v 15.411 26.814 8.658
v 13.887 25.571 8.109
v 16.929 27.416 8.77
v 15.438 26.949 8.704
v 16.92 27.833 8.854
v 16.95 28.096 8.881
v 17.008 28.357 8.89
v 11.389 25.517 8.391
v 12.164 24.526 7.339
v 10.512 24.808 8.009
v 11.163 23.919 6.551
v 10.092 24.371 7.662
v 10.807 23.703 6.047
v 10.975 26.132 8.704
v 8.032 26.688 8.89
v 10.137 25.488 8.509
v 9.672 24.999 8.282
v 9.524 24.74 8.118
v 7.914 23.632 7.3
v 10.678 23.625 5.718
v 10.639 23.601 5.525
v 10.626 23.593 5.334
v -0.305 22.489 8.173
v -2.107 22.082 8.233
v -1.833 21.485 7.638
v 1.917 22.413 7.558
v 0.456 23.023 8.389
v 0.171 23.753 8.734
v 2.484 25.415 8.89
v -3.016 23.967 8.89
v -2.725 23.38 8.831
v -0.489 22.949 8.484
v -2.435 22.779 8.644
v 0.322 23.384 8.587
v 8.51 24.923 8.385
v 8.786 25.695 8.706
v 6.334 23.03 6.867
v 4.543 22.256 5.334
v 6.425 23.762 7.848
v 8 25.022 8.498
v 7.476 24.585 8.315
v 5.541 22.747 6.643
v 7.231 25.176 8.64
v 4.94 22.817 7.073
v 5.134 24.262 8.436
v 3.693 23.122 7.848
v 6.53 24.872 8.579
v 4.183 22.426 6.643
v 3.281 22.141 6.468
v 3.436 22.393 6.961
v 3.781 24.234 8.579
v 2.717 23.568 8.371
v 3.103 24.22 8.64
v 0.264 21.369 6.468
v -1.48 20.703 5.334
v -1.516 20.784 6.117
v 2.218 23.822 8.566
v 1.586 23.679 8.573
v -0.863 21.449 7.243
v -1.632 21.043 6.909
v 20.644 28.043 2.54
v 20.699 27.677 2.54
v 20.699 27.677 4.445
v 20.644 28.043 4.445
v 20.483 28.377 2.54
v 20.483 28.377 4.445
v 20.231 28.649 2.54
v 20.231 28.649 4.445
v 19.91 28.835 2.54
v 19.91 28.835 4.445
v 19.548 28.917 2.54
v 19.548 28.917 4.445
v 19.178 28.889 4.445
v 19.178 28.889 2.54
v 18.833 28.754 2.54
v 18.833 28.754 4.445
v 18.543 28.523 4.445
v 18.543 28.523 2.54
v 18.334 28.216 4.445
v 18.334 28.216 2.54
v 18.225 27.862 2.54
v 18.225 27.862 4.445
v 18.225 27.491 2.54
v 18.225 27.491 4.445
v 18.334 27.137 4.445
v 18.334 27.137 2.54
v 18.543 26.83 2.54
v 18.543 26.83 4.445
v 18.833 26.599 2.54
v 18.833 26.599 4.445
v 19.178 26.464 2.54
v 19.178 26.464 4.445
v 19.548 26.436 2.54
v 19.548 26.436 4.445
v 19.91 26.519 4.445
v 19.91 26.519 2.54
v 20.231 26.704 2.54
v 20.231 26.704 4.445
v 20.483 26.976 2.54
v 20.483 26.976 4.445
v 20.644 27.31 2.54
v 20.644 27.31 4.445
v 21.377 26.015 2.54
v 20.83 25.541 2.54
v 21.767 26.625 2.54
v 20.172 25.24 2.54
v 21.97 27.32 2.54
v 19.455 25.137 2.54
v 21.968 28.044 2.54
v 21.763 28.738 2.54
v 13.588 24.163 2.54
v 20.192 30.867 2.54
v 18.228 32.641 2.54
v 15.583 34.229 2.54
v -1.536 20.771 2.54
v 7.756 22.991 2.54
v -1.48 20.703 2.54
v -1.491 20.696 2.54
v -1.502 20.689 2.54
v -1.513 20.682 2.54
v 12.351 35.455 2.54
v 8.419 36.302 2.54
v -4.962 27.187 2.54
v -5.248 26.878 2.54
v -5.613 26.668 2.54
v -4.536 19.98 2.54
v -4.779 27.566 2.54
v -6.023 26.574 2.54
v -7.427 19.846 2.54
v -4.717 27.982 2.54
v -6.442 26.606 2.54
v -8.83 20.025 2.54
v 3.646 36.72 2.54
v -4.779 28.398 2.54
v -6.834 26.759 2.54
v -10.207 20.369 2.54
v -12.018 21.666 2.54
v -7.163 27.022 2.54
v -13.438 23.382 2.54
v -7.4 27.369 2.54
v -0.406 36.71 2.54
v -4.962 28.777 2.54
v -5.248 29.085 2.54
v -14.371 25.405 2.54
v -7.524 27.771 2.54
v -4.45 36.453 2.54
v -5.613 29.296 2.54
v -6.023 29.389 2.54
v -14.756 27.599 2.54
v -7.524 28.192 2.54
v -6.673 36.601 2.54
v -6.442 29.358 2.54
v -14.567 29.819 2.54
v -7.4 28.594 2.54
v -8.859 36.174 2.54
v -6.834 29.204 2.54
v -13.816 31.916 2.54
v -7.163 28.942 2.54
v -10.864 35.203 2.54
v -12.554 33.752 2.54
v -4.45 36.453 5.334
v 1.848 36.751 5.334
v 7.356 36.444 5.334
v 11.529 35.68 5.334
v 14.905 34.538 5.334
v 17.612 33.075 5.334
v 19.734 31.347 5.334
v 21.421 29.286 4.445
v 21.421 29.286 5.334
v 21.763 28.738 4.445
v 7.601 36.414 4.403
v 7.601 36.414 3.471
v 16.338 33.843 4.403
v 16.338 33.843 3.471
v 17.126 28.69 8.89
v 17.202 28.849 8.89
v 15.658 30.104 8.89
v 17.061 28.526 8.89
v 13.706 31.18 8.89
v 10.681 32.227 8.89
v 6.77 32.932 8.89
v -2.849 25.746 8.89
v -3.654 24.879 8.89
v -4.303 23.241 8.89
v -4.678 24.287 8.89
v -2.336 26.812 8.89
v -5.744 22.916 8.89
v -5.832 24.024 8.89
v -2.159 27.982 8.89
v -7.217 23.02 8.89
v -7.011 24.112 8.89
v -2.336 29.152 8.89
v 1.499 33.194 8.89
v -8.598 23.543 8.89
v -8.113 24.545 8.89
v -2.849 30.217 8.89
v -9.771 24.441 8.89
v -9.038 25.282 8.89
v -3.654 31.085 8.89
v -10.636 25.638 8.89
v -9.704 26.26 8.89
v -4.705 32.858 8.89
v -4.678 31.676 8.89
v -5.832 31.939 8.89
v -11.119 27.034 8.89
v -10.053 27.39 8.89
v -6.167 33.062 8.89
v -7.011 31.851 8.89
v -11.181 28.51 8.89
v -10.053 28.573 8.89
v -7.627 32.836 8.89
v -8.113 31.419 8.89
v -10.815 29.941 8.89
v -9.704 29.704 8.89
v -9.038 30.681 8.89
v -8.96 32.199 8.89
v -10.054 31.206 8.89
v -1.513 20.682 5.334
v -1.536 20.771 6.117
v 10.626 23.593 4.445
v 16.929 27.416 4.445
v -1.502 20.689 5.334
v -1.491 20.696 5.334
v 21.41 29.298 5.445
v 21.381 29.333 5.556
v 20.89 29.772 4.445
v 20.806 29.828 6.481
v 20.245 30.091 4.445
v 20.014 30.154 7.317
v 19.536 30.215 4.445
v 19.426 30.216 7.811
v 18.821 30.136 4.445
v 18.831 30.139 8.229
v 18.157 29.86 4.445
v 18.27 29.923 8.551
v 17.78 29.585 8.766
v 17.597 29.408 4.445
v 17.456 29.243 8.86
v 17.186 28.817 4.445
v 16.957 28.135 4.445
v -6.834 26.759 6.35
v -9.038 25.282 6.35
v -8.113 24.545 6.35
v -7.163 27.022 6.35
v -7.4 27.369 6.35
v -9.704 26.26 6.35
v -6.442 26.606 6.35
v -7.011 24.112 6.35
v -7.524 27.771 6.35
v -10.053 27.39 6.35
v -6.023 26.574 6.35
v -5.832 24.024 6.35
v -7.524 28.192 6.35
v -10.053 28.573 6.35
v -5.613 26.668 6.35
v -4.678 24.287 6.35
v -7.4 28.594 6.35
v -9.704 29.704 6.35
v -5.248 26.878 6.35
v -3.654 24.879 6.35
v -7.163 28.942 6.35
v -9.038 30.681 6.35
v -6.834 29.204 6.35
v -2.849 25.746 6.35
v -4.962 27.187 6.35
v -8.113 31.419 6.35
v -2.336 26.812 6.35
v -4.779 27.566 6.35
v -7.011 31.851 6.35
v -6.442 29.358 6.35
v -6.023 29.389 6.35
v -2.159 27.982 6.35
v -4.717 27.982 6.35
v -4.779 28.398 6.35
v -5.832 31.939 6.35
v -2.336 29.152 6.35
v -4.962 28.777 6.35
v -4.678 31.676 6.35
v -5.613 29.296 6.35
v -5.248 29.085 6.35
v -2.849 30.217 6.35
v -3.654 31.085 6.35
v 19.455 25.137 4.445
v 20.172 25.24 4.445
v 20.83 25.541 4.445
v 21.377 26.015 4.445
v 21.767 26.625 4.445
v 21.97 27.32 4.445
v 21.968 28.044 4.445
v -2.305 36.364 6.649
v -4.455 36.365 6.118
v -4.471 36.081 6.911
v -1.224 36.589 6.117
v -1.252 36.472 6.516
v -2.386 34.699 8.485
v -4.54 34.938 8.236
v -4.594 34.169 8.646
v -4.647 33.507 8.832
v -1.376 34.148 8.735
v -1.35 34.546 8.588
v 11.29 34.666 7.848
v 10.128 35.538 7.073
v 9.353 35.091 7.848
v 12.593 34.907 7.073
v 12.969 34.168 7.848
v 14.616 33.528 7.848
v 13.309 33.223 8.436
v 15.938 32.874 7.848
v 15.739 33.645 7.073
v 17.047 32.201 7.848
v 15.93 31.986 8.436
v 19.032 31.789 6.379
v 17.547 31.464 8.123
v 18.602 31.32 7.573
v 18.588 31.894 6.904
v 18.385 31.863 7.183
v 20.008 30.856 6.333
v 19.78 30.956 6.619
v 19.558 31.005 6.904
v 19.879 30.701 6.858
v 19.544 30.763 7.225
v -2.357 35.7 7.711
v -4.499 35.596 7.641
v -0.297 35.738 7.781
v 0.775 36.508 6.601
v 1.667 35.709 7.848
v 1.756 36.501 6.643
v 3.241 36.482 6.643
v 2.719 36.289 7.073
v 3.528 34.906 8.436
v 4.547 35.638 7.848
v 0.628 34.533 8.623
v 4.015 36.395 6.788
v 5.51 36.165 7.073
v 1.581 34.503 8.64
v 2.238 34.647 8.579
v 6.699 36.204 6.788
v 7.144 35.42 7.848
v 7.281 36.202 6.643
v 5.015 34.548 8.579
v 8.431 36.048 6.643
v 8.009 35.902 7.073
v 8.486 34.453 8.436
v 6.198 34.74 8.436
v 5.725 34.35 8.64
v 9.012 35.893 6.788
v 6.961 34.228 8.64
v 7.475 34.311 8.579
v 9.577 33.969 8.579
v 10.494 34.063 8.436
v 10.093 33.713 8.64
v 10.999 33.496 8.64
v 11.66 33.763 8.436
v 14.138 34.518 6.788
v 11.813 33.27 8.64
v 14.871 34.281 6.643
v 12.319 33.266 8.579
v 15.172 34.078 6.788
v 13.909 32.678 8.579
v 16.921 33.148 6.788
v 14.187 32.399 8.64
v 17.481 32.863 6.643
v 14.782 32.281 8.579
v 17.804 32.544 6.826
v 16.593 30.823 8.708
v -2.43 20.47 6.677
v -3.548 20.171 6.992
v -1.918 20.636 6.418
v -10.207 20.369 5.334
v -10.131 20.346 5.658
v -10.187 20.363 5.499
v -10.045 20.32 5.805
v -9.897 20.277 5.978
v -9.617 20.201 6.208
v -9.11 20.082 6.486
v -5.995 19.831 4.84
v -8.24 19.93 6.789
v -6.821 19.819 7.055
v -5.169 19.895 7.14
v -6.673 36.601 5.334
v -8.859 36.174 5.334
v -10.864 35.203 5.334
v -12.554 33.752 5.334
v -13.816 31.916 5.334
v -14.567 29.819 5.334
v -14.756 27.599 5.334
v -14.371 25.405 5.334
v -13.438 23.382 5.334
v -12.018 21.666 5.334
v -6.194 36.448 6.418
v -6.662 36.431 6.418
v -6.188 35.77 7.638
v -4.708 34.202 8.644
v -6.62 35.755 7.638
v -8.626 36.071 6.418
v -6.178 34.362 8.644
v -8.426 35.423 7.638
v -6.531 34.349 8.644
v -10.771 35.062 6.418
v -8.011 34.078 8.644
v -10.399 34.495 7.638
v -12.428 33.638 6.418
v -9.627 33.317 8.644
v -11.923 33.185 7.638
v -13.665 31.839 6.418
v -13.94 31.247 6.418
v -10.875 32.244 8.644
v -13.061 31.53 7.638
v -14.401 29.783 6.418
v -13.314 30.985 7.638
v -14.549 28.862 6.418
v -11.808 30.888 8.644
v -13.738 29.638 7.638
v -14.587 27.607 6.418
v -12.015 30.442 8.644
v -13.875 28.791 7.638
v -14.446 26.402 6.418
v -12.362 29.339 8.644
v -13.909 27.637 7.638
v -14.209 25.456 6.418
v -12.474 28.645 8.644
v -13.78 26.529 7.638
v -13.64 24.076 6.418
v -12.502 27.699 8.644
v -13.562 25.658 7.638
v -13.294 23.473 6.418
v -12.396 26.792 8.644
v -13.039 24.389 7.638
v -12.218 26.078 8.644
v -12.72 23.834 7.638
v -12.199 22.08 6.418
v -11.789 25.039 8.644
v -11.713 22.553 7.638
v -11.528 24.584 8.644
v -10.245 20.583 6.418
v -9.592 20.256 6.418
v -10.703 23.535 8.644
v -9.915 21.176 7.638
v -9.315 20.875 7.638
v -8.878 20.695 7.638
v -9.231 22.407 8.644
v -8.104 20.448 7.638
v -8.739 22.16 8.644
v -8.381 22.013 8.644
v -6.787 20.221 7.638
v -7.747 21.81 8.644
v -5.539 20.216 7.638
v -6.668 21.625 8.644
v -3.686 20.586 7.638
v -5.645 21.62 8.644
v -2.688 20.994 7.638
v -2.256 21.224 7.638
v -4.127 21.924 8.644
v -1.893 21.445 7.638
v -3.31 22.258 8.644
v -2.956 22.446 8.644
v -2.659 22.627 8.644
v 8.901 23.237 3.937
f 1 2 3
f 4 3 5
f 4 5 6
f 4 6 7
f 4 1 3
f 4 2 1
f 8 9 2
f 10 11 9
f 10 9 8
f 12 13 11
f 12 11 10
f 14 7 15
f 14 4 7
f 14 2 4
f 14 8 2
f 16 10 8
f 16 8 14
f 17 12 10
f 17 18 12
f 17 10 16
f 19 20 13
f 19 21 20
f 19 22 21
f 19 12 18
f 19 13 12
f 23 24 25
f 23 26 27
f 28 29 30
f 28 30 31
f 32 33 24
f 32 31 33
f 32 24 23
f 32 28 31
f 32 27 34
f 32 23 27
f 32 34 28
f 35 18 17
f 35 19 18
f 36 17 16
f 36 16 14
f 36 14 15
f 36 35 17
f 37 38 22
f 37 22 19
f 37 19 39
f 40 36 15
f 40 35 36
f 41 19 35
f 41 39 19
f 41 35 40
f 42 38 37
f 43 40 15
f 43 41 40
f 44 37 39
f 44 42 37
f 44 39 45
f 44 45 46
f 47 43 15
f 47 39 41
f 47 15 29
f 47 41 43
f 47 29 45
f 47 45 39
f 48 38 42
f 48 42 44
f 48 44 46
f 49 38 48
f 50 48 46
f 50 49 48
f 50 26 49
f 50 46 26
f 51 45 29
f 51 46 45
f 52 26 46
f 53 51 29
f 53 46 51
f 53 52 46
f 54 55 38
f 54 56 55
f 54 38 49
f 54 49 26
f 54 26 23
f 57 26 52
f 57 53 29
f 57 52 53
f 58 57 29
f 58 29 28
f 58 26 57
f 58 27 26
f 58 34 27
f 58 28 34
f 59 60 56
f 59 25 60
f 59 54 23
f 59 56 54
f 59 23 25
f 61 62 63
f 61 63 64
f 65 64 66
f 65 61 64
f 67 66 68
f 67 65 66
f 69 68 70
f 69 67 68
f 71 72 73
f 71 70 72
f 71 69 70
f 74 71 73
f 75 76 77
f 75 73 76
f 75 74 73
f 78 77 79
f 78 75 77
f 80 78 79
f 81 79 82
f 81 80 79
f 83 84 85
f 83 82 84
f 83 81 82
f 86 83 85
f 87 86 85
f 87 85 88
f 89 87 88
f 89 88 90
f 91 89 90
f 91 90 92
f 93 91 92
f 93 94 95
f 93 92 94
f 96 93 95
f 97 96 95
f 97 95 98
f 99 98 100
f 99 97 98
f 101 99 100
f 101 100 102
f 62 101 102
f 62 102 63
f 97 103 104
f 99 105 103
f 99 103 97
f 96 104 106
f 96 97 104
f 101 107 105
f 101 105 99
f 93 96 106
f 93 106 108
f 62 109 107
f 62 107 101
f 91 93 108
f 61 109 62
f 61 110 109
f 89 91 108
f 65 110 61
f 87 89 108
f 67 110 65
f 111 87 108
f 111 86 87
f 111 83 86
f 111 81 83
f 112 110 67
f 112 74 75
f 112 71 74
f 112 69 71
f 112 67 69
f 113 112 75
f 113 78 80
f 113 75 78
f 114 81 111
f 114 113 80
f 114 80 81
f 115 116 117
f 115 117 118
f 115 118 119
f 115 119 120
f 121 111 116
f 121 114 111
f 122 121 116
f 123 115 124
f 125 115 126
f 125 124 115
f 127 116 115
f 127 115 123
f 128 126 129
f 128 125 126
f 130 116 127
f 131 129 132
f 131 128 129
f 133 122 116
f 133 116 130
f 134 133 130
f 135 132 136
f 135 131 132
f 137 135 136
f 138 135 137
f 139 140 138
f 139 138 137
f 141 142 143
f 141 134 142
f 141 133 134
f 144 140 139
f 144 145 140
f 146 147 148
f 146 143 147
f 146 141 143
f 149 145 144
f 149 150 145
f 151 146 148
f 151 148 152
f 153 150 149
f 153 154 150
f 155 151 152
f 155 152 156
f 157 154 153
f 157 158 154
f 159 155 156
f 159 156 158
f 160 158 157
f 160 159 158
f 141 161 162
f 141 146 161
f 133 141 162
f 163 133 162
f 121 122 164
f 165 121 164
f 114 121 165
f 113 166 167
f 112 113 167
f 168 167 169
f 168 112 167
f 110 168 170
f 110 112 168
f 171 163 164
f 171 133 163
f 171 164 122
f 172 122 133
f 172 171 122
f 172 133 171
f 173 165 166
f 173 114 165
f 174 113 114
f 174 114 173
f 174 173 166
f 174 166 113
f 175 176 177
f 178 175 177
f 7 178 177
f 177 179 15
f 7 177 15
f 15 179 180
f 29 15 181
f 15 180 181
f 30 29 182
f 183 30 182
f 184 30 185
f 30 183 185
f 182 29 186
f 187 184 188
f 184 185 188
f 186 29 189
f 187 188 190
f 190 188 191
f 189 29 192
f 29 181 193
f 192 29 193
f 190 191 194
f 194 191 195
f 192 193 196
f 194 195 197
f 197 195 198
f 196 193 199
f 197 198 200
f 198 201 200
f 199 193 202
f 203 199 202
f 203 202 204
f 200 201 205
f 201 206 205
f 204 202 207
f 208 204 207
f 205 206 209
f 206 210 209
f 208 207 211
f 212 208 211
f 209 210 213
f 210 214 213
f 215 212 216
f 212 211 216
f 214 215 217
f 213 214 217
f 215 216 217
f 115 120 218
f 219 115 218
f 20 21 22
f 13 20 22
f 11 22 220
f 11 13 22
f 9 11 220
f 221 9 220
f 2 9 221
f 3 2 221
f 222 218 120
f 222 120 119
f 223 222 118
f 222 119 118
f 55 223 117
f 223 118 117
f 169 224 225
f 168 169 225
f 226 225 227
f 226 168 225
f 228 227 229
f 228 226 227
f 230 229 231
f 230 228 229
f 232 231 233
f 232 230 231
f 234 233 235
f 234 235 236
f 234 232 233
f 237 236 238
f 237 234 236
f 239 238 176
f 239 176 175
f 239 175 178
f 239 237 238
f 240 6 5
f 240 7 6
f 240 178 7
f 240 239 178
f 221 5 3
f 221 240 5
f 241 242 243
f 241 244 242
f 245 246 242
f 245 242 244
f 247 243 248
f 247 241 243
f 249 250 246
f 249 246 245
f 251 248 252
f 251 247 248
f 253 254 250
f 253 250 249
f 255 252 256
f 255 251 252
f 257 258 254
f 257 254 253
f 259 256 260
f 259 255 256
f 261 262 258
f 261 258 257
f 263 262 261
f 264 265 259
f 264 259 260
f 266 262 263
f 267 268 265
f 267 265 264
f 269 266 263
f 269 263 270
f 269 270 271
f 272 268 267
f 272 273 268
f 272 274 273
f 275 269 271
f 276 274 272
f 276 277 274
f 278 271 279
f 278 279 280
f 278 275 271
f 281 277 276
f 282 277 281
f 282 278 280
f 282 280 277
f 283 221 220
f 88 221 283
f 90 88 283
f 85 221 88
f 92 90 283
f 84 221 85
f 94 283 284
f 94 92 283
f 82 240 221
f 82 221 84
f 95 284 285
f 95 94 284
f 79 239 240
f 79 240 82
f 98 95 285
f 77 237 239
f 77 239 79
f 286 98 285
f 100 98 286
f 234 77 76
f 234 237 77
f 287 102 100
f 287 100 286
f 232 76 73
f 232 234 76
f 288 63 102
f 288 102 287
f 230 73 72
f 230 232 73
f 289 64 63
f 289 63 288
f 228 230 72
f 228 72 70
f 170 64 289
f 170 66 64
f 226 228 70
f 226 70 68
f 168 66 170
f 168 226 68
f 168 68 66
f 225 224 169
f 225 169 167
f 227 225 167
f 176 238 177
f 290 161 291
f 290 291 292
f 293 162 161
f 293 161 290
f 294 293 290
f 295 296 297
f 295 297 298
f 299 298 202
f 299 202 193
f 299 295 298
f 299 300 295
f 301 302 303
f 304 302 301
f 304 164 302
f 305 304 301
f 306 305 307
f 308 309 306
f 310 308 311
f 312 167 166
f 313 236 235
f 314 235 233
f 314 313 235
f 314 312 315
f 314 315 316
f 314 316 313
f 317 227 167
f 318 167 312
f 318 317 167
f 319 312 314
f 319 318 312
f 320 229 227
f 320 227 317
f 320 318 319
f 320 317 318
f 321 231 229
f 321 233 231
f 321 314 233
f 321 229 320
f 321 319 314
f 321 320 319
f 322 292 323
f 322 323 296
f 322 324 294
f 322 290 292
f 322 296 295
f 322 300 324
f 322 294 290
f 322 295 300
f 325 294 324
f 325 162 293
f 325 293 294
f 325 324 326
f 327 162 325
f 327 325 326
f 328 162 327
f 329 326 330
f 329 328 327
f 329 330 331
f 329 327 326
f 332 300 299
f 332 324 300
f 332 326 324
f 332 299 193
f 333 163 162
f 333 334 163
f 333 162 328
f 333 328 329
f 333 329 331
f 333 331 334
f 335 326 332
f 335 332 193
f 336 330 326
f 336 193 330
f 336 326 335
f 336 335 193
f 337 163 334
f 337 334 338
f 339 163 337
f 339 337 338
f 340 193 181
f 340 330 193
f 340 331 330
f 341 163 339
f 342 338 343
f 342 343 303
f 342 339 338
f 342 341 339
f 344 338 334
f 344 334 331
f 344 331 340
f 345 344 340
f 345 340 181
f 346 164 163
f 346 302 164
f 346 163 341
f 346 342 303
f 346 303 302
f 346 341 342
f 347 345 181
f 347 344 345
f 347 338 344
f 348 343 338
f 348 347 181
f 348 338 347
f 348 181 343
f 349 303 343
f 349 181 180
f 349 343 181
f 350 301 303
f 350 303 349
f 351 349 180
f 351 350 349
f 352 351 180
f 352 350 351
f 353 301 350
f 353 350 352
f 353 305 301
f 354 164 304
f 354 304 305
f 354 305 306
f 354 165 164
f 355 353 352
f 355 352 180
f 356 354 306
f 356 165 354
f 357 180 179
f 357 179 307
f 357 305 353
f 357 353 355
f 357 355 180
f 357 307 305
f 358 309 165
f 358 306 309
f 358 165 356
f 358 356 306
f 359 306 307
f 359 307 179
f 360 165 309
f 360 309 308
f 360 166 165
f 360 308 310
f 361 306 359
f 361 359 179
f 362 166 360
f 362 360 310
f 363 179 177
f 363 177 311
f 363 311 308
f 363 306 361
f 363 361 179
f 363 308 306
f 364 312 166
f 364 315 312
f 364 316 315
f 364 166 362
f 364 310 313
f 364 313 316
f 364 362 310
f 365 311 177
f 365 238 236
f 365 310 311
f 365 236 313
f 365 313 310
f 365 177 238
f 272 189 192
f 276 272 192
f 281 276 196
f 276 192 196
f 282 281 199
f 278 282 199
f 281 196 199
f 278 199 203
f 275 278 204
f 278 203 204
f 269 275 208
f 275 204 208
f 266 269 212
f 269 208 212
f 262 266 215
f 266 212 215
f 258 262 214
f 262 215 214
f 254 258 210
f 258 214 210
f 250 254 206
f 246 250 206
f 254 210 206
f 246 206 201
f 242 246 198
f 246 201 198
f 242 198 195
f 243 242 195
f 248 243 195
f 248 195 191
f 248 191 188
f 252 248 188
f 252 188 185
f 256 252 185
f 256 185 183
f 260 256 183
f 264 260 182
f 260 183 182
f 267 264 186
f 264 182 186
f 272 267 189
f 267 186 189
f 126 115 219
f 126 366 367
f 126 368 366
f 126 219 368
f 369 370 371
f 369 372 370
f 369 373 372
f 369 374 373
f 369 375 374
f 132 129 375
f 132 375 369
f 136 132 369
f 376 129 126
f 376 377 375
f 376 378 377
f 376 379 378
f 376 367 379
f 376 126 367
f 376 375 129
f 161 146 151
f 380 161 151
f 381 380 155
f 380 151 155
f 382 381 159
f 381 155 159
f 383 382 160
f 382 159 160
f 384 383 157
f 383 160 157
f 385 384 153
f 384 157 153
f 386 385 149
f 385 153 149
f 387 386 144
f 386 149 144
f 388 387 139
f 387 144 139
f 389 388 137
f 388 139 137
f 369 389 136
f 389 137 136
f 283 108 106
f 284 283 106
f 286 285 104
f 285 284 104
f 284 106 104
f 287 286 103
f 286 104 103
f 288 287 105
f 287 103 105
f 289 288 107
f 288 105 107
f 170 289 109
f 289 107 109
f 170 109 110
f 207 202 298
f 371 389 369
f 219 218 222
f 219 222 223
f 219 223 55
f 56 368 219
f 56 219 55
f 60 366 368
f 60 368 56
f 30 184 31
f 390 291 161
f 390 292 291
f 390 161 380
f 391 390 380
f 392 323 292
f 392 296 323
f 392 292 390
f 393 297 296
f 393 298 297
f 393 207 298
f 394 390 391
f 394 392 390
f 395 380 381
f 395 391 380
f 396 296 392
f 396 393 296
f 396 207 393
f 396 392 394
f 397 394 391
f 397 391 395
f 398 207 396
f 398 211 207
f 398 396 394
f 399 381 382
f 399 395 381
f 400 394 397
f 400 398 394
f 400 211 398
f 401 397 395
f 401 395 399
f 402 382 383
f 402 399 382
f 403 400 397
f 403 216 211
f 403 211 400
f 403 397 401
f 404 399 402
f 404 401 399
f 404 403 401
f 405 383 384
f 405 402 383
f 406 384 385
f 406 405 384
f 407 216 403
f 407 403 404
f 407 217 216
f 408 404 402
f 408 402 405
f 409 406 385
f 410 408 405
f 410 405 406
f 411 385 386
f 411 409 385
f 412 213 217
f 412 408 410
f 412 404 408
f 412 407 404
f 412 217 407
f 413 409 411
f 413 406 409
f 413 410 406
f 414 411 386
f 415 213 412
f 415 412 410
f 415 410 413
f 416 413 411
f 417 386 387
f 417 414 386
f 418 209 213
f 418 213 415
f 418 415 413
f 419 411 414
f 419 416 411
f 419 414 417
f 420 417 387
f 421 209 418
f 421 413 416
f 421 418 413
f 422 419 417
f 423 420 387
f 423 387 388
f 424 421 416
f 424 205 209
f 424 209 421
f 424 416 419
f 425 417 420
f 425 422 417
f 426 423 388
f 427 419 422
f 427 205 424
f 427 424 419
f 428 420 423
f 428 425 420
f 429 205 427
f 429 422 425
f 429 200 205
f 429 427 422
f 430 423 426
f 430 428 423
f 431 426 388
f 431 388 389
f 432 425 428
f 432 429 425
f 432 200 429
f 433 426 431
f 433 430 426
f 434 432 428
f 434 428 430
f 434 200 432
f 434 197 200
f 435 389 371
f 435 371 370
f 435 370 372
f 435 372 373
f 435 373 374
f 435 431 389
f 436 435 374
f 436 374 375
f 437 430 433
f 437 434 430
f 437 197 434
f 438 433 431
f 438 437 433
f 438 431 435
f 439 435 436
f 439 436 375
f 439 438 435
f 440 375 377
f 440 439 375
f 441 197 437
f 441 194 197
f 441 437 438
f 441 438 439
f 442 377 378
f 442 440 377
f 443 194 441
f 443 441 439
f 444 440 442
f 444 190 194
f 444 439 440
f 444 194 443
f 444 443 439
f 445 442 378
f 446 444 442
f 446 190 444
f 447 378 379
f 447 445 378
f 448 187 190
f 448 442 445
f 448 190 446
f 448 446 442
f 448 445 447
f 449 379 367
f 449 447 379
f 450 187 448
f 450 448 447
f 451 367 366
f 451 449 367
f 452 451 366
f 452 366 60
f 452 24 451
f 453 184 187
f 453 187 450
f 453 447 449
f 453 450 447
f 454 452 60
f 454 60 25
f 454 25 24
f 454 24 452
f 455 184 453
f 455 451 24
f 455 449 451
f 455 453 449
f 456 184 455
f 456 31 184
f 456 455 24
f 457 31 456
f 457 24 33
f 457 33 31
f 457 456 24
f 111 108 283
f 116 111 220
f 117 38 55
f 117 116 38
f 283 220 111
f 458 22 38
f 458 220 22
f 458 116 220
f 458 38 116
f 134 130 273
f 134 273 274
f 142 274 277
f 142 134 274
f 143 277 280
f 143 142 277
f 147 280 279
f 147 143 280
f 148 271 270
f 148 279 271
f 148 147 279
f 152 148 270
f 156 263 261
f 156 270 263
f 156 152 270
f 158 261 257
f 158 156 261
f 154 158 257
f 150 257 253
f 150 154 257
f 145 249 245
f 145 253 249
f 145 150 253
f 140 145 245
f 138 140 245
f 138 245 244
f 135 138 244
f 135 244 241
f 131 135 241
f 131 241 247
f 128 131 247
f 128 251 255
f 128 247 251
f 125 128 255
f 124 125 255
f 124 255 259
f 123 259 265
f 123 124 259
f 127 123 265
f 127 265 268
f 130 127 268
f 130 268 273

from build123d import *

# Parameters (mm, degrees)
BOSS_EXTRUDE1_OUTLINE_R   = 1.411527177
BOSS_EXTRUDE1_OUTLINE_R_2 = 1.243983369
BOSS_EXTRUDE1_DEPTH       = 8.89
CUT_EXTRUDE1_START        = -4.445
SKETCH3_R                 = 2.54
CUT_EXTRUDE1_DEPTH        = 4.445
FILLET2_R                 = 3.556
SKETCH4_W                 = 38.788702954
SKETCH4_H                 = 29.49823266
CUT_EXTRUDE2_DEPTH        = 2.54
SKETCH5_R                 = 3.96875
CUT_EXTRUDE6_DEPTH        = 2.54
CUT_EXTRUDE9_DEPTH        = 4.445
CUT_EXTRUDE10_DEPTH       = 8.89


# Read off the part's stored shape, not the designer's step: Boss-Extrude1
with BuildPart() as part:
    # Boss-Extrude1 outline → Boss-Extrude1 (new body)
    with BuildSketch(Plane.XY):
        with BuildLine():
            add(Edge.make_bspline(
                [(-4.450270059, 36.453127637), (9.257211294, 37.68062732), (17.994865779, 35.108973576), (21.762693397, 28.738166405)],
                knots=[0.06260201, 0.06260201, 0.06260201, 0.06260201, 0.571198862, 0.571198862, 0.571198862, 0.571198862], degree=3))
            ThreePointArc((-4.450270059, 36.453127637), (-14.614683226, 26.381475664), (-1.480390785, 20.703110531))
            add(Edge.make_bspline(
                [(19.455202419, 25.136523629), (8.814175151, 23.55437226), (-1.480390785, 20.703110531)],
                knots=[0, 0, 0, 0.700849117, 0.700849117, 0.700849117], degree=2))
            ThreePointArc((19.455202419, 25.136523629), (21.593913789, 26.306299678), (21.762693397, 28.738166405))
        make_face()
        with Locations((-6.128238366, 27.981709907)):
            Circle(BOSS_EXTRUDE1_OUTLINE_R, mode=Mode.SUBTRACT)
        with Locations((19.455202419, 27.676523629)):
            Circle(BOSS_EXTRUDE1_OUTLINE_R_2, mode=Mode.SUBTRACT)
    extrude(amount=BOSS_EXTRUDE1_DEPTH)

    # Sketch3 → Cut-Extrude1 (cut)
    with BuildSketch(Plane.XY.offset(8.89).offset(CUT_EXTRUDE1_START)):
        with Locations((19.455202419, 27.676523629)):
            Circle(SKETCH3_R)
    extrude(amount=CUT_EXTRUDE1_DEPTH, mode=Mode.SUBTRACT)

    # Fillet2
    fillet2_edges = [part.edges().sort_by_distance(p)[0] for p in [
        (-14.614683226, 26.381475664, 8.89),
        (8.919366654, 23.241027384, 8.89),
        (9.568834416, 36.110759147, 8.89),
    ]]
    fillet(fillet2_edges, radius=FILLET2_R)

    # Sketch4 → Cut-Extrude2 (cut)
    with BuildSketch(Plane(origin=(0, 0, 0), x_dir=(-1, 0, 0), z_dir=(0, 0, -1))):
        with Locations((-4.403454377, 29.061669641)):
            Rectangle(SKETCH4_W, SKETCH4_H)
    extrude(amount=-CUT_EXTRUDE2_DEPTH, mode=Mode.SUBTRACT)

    # Sketch5 → Cut-Extrude6 (cut)
    with BuildSketch(Plane.XY.offset(8.89)):
        with Locations((-6.128238366, 27.981709907)):
            Circle(SKETCH5_R)
    extrude(amount=-CUT_EXTRUDE6_DEPTH, mode=Mode.SUBTRACT)

    # Sketch11 → Cut-Extrude9 (cut)
    with BuildSketch(Plane.XY.offset(8.89)):
        Polygon((8.044294619, 22.027673787), (18.775840599, 28.536123817), (19.455202419, 27.676523629), (23.93696494, 27.676523629), (25.091261189, 21.861175279), (8.722262202, 18.612070842), align=None)
    extrude(amount=-CUT_EXTRUDE9_DEPTH, mode=Mode.SUBTRACT)

    # Sketch13 → Cut-Extrude10 (cut)
    with BuildSketch(Plane(origin=(0, 0, 2.54), x_dir=(-1, 0, 0), z_dir=(0, 0, -1))):
        with BuildLine():
            Line((10.206570894, 20.369371253), (8.596583203, 18.138185272))
            Line((8.596583203, 18.138185272), (1.153394416, 19.253778262))
            Line((1.153394416, 19.253778262), (1.535882515, 20.771294499))
            add(Edge.make_bspline(
                [(1.535882515, 20.771294499), (6.119525821, 19.09120268), (10.206570894, 20.369371253)],
                knots=[0, 0, 0, 0.81876004, 0.81876004, 0.81876004], degree=2))
        make_face()
    extrude(amount=-CUT_EXTRUDE10_DEPTH, mode=Mode.SUBTRACT)


solid = part.part
